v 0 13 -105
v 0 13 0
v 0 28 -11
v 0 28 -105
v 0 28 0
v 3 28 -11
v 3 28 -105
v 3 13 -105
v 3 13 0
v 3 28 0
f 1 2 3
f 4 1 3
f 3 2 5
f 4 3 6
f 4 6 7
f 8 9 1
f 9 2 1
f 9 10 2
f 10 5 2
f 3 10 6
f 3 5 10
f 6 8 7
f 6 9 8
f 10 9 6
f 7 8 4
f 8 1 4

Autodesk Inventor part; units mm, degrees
ref_plane "YZ Plane" through (0, 0, 0) normal (1, 0, 0) x (0, 1, 0)
ref_plane "XZ Plane" through (0, 0, 0) normal (0, 1, 0) x (-1, 0, 0)
ref_plane "XY Plane" through (0, 0, 0) normal (0, 0, 1) x (1, 0, 0)
sketch "Sketch1" plane through (0, 0, 0) normal (1, 0, 0) x (0, 1, 0)
  line L0 (0, 0) -> (18, 0) construction
  line L1 (18, 0) -> (18, -390) construction
  line L2 (18, -390) -> (0, -390) construction
  line L3 (0, -390) -> (0, 0) construction
  line L4 (96, 0) -> (78, 0) construction
  line L5 (78, 0) -> (78, -210) construction
  line L6 (78, -210) -> (96, -210) construction
  line L7 (96, -210) -> (96, 0) construction
  line L8 (18, 0) -> (28, 0) construction
  line L9 (28, 0) -> (28, -210)
  line L10 (28, -210) -> (18, -210) construction
  line L11 (18, -210) -> (18, 0) construction
  circle A0 centre (53, -21.3494) radius 25 construction
  line L12 (28, 0) -> (13, 0)
  line L13 (13, 0) -> (13, -105)
  line L14 (13, -105) -> (28, -105)
  line L15 (28, 0) -> (35, 0)
  line L16 (35, 0) -> (35, -4)
  arc A1 (35, -4) -> (28, -11) centre (35, -11) ccw
  line L17 (28, -11) -> (28, -105)
  point P0 (20.5, -105)
  dimension "d6" = 50
  dimension "d0" = 18
  dimension "d1" = 210
  dimension "d2" = 18
  dimension "d3" = 60
  dimension "d4" = 390
  dimension "d5" = 10
  dimension "d7" = 5
  dimension "d11" = 7
  dimension "d12" = 4
  dimension "d13" = 7
extrude "Extrusion1" add sketch "Sketch1" along normal blind 3 contours L9 L14 L13 L12
properties part number "rail-210"
